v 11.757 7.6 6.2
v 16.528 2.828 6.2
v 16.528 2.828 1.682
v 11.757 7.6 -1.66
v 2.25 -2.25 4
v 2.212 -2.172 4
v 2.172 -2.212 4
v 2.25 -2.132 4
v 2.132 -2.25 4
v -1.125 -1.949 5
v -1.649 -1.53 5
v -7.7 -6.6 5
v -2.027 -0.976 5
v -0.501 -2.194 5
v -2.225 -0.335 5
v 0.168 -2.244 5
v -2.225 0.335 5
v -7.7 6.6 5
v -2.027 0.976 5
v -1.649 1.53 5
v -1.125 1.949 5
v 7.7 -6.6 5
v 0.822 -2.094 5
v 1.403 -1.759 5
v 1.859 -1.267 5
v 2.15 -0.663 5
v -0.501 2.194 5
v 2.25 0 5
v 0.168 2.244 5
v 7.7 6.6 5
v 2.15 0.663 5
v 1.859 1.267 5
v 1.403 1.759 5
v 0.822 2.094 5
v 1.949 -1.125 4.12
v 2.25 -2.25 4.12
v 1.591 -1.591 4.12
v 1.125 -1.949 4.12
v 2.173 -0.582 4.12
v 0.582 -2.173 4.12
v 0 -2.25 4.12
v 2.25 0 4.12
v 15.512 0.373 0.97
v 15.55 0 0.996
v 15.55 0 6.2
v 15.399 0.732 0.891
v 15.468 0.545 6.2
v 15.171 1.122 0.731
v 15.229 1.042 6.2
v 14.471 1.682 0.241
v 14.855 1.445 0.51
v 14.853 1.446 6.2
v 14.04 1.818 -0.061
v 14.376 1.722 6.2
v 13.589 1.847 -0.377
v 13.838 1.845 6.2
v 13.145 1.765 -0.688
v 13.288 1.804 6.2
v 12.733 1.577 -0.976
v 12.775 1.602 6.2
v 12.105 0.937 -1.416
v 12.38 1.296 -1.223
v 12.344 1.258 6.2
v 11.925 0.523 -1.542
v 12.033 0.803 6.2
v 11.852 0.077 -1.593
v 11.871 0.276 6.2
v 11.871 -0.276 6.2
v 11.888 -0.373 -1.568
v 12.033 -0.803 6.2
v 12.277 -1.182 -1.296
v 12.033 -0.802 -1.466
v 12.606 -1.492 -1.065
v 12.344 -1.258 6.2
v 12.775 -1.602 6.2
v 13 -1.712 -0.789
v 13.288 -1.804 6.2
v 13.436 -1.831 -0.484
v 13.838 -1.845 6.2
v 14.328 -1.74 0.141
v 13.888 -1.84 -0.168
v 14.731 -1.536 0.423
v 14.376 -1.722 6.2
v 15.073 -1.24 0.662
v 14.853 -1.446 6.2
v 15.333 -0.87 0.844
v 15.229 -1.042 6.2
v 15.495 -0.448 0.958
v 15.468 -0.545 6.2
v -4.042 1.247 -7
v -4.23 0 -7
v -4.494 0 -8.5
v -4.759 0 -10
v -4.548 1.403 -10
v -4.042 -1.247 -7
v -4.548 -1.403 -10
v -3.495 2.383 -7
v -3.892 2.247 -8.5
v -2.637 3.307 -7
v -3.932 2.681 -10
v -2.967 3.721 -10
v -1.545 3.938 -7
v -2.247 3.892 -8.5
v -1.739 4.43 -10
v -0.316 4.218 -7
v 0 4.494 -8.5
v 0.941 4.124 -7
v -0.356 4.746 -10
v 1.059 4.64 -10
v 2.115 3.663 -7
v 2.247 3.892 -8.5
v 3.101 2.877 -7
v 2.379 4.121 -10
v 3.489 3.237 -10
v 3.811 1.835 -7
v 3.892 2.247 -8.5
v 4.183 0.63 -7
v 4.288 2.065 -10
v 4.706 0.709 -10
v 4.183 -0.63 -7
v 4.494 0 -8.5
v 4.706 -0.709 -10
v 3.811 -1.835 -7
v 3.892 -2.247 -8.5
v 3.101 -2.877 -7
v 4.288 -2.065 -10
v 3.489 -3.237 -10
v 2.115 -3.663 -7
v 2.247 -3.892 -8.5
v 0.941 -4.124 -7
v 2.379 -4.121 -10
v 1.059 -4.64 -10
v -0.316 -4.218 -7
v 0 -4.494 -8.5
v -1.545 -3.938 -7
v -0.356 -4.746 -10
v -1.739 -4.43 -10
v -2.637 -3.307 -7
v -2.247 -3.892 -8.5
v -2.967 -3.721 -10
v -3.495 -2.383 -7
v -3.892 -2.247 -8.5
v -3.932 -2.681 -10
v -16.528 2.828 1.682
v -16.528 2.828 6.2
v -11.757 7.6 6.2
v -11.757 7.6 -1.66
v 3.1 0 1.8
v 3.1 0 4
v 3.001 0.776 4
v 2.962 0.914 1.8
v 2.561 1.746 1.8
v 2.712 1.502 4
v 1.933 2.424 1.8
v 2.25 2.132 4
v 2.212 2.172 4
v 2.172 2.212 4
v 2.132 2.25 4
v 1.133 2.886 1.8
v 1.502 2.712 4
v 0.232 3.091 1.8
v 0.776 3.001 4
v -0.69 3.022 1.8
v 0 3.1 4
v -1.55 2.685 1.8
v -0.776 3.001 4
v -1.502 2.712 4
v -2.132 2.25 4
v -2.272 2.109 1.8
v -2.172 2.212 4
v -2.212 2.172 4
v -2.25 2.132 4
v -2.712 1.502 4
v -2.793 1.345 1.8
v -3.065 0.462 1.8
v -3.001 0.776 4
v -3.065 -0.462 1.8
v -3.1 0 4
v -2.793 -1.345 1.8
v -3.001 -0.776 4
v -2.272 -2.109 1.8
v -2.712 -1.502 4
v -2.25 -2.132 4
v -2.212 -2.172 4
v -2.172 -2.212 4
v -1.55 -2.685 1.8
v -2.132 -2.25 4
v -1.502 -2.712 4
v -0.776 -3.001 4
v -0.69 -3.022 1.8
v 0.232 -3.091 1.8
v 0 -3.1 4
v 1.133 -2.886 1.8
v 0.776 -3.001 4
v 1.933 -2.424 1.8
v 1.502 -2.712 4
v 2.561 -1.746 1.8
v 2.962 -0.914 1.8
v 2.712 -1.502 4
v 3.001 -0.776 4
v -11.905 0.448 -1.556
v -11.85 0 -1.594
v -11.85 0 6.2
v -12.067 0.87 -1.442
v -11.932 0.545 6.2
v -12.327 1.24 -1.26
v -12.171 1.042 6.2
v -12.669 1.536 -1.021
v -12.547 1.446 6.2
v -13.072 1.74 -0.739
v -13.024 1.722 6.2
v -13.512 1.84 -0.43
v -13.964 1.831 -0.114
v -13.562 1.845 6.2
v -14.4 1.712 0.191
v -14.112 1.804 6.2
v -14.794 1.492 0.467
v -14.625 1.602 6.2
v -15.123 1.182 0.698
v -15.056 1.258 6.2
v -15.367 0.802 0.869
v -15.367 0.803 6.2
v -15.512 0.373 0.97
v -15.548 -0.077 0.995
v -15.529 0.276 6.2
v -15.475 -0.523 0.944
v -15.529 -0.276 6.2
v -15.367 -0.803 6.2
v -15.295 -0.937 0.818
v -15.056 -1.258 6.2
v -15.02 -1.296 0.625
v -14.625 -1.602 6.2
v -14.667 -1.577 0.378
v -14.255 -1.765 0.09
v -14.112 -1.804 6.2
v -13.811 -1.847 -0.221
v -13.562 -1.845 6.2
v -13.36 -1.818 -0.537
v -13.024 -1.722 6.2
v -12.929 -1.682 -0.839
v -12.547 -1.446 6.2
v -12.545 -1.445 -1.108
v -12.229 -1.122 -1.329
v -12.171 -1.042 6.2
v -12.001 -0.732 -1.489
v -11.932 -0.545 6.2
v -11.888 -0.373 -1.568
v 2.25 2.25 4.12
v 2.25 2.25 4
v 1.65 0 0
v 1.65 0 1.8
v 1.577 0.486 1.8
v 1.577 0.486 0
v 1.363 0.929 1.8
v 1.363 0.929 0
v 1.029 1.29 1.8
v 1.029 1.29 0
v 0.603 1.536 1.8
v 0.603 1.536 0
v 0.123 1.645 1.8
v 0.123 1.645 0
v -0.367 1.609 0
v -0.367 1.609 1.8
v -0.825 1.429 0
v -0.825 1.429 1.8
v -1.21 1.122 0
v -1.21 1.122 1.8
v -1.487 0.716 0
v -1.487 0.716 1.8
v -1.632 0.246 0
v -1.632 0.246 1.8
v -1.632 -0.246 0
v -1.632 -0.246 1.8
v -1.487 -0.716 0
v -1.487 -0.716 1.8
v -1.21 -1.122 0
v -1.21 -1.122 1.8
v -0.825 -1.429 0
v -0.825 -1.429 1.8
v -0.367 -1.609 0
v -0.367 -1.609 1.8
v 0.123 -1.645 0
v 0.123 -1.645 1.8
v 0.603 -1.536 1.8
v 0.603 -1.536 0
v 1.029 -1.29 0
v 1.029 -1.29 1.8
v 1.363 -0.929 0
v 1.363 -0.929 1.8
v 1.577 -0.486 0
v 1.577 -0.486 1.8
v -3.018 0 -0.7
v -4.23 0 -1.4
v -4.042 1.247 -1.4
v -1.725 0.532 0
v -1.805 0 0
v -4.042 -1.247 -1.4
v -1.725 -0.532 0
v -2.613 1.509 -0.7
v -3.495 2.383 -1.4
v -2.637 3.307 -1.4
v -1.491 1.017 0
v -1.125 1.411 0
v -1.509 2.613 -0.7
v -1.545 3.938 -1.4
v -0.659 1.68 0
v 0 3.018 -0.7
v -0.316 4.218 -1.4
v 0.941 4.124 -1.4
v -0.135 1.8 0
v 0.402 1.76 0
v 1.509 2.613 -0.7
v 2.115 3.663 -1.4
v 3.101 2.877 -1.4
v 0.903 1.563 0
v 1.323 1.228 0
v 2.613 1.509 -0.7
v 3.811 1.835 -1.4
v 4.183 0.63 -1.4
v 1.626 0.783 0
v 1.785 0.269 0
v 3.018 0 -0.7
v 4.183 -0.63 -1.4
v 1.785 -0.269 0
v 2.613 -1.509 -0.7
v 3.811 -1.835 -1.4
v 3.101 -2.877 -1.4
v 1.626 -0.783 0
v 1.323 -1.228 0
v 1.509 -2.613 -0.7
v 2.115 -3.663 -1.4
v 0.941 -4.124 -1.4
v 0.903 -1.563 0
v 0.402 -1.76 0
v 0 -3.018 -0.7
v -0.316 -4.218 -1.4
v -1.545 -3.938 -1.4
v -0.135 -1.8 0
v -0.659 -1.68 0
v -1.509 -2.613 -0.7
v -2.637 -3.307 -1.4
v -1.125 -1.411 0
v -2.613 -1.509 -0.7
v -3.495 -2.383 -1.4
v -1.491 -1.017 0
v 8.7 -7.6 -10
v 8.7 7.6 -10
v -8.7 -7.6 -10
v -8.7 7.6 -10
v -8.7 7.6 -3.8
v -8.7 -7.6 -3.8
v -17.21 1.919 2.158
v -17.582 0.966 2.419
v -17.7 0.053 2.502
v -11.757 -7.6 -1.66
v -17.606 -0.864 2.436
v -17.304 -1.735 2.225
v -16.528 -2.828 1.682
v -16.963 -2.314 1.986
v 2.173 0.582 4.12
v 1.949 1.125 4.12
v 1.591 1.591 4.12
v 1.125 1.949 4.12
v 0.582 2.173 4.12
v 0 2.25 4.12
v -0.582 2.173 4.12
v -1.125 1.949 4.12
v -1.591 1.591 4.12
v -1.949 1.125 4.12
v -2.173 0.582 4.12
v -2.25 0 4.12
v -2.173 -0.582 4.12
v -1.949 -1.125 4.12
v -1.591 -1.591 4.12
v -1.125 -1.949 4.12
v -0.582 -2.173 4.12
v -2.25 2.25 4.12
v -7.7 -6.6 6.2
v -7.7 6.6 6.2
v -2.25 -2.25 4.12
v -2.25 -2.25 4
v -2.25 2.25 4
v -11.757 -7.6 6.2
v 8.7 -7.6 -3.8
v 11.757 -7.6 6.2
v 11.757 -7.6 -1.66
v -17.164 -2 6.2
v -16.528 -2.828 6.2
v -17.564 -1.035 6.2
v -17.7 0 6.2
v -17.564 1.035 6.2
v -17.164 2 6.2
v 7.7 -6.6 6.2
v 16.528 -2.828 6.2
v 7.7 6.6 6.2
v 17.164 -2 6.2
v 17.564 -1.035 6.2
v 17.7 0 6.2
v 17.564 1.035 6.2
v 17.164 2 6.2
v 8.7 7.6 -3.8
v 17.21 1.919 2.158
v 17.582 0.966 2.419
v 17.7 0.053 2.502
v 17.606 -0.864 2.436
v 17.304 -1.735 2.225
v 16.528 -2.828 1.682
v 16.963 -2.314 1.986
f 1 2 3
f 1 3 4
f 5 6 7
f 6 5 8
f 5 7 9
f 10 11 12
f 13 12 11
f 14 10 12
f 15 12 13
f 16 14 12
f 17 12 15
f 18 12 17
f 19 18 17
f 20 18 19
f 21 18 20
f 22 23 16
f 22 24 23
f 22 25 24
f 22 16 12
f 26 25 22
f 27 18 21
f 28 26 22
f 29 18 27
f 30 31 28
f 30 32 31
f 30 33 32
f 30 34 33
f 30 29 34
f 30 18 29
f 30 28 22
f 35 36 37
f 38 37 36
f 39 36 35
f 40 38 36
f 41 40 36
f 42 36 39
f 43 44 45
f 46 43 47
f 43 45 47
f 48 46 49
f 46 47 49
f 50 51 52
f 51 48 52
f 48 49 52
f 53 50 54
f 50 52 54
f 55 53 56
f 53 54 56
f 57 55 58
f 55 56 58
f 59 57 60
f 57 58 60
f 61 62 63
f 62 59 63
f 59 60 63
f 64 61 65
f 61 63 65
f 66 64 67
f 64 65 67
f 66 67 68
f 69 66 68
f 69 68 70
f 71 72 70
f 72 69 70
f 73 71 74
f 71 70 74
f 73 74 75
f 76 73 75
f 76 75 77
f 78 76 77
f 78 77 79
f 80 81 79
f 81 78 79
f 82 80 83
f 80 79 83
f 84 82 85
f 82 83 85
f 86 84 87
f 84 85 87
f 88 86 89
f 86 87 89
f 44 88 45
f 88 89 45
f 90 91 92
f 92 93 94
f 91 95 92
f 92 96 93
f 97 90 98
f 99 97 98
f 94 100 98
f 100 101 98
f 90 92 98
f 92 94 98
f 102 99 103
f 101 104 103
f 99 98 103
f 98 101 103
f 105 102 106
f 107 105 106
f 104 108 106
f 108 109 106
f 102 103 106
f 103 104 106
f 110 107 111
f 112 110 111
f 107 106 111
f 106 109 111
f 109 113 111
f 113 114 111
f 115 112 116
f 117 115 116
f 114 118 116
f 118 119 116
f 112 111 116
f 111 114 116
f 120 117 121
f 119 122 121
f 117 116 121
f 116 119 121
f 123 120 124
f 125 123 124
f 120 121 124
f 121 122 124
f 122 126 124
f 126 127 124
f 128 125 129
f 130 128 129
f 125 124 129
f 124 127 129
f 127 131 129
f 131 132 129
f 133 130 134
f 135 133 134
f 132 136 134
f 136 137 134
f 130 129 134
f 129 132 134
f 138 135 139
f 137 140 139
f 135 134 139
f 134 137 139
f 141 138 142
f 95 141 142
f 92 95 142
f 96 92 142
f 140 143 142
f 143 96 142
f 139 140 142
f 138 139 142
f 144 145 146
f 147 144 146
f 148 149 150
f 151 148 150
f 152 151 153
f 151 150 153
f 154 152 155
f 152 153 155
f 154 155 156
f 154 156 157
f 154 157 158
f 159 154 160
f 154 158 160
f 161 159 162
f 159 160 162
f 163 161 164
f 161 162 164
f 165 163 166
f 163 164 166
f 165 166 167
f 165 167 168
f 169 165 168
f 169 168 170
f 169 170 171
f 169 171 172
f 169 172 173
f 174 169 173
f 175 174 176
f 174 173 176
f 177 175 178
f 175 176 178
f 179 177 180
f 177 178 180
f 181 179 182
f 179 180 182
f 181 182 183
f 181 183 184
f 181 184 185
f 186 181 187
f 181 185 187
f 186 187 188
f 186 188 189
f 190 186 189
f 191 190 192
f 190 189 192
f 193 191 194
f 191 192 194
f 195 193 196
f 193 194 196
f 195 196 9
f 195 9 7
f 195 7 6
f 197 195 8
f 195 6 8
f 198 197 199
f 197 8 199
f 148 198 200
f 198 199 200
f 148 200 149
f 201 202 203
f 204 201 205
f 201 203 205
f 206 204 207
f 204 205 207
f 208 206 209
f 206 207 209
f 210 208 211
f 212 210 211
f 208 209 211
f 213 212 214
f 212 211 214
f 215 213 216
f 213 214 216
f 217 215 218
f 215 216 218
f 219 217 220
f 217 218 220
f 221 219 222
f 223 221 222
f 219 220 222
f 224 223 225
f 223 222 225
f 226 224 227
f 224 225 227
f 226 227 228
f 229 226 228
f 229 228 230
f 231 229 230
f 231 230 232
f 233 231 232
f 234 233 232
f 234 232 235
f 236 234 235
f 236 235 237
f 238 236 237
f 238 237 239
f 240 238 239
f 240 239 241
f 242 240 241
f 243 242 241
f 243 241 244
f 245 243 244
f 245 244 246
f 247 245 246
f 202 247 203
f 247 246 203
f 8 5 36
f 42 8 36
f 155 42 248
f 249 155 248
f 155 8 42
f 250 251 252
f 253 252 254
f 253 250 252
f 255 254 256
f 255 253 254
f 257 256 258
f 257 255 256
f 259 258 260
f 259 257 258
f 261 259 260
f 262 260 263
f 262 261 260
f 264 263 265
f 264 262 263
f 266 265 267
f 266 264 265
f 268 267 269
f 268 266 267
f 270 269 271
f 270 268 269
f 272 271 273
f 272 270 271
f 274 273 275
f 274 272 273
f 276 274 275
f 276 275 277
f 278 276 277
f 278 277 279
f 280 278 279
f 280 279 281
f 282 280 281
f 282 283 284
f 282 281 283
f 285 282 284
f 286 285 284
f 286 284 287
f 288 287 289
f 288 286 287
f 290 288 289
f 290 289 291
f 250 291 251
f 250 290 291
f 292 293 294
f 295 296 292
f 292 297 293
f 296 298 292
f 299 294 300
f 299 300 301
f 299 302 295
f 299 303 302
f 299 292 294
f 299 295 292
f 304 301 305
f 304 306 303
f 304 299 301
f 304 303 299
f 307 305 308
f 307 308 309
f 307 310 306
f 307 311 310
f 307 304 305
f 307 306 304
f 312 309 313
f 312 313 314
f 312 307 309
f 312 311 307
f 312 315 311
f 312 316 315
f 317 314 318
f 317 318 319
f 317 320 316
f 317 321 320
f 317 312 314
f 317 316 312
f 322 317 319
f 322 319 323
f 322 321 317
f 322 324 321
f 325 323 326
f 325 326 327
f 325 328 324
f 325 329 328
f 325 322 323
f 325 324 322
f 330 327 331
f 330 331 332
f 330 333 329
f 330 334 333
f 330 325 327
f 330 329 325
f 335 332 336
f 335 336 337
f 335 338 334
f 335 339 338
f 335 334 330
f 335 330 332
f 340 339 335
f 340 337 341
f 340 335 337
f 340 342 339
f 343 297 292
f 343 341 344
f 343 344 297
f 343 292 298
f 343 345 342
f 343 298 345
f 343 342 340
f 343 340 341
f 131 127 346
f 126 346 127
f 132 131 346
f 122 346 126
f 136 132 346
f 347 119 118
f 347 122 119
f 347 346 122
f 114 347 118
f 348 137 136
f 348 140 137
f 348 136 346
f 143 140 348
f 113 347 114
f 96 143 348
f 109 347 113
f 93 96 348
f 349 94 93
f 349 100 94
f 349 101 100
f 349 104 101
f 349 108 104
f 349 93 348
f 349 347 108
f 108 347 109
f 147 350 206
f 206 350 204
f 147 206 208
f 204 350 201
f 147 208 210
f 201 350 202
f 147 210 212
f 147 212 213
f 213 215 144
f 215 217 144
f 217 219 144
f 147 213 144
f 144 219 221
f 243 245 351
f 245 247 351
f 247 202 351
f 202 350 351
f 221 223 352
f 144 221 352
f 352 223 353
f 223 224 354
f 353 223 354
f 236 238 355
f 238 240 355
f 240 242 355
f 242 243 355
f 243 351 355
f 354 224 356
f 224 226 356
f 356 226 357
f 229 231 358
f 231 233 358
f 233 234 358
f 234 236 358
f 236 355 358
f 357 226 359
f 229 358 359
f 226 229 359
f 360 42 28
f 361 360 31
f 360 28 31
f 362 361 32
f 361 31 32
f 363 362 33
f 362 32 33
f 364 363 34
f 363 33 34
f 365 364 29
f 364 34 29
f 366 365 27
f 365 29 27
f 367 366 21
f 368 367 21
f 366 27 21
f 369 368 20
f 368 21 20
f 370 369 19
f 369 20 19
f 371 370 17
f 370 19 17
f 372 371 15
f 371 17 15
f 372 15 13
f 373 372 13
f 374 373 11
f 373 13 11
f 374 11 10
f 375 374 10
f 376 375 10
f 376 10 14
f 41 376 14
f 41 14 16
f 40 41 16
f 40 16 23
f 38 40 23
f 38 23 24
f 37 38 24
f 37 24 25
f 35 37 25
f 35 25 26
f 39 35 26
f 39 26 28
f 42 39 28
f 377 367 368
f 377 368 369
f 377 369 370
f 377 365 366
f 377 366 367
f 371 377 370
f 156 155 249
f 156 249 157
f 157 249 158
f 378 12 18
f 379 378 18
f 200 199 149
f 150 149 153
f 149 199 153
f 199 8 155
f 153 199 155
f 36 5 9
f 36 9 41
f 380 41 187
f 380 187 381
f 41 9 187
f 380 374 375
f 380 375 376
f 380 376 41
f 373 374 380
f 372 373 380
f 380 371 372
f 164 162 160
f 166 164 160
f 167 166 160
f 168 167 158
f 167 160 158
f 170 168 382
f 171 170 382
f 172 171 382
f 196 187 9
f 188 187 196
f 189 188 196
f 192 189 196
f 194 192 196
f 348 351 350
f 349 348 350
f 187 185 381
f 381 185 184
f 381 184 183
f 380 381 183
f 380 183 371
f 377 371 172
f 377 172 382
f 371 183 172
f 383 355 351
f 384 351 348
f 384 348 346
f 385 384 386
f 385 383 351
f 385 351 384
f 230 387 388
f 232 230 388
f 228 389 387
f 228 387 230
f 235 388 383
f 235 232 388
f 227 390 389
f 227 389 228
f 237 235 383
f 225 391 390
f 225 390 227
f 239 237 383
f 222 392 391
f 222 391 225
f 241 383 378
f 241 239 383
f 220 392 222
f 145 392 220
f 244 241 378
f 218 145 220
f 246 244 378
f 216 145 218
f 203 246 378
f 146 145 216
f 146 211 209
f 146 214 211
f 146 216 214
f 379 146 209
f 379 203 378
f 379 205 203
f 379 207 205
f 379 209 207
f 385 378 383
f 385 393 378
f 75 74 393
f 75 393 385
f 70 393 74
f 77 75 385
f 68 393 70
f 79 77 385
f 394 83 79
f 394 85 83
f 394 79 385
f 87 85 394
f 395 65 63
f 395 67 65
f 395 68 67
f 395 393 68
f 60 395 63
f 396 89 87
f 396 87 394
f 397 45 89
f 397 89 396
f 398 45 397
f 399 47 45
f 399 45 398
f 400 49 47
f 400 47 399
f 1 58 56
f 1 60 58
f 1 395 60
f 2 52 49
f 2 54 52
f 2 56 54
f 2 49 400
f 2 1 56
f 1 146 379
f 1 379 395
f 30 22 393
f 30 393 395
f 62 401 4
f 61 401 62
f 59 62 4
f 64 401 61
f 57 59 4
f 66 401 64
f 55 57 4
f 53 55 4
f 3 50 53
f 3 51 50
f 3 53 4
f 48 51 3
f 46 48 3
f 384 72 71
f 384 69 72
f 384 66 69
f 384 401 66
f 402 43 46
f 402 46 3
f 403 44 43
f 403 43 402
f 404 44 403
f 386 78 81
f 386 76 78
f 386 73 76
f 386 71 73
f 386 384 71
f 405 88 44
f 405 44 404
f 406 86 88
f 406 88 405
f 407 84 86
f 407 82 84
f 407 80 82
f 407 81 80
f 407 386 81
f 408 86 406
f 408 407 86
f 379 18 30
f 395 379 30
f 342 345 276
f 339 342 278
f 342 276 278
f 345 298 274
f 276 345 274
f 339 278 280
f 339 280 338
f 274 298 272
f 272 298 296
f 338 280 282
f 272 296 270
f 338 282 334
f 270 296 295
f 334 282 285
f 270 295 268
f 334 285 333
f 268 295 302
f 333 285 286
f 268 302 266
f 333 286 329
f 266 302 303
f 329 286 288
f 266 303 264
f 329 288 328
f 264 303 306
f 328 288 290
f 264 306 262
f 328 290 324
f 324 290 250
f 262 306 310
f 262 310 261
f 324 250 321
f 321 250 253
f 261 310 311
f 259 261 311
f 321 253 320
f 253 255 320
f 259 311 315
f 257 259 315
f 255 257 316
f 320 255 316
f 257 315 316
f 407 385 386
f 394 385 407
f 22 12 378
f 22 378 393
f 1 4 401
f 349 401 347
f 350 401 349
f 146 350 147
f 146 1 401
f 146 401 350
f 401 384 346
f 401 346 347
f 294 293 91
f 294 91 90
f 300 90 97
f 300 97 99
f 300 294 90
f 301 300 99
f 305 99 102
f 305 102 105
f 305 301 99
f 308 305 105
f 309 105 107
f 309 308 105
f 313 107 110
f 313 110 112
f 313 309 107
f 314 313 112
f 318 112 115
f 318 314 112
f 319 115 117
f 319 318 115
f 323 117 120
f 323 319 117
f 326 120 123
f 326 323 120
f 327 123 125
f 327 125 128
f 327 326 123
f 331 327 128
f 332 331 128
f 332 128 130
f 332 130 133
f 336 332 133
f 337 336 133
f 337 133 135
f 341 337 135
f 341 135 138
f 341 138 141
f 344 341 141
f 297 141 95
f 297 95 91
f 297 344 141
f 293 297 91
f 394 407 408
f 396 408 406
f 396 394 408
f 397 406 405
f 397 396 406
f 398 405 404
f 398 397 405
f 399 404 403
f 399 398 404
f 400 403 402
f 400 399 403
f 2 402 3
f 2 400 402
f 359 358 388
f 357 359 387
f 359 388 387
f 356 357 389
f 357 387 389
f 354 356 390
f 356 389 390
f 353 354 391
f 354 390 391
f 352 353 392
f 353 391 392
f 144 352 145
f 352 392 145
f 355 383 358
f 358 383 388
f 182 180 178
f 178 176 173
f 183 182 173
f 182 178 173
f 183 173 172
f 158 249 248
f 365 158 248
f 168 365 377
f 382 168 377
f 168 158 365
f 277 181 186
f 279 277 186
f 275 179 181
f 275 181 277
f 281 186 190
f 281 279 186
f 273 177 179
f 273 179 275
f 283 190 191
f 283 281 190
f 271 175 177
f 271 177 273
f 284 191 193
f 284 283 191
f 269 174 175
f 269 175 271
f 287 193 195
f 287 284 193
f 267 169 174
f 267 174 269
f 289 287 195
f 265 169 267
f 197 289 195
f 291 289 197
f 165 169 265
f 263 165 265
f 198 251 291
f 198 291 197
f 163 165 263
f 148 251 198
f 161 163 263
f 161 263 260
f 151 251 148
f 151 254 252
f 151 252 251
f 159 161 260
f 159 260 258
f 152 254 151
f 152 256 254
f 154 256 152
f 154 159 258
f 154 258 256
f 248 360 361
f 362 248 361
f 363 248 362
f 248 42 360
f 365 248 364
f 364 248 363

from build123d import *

# Parameters (mm, degrees)
SKETCH1_W           = 17.4
SKETCH1_H           = 15.2
SKETCH1_R           = 1.65
BOSS_EXTRUDE1_DEPTH = 5
SKETCH2_W           = 17.4
SKETCH2_H           = 15.2
SKETCH2_W_2         = 15.4
SKETCH2_H_2         = 13.2
BOSS_EXTRUDE2_DEPTH = 1.2
CUT_EXTRUDE1_START  = -1
SKETCH3_R           = 3.1
CUT_EXTRUDE1_DEPTH  = 2.2
SKETCH4_R           = 2.25
CUT_EXTRUDE2_DEPTH  = 1
SKETCH6_W           = 4.5
SKETCH6_H           = 4.5
CUT_EXTRUDE4_DEPTH  = 0.12
SKETCH7_W           = 17.4
SKETCH7_H           = 15.2
SKETCH7_R           = 4.23
BOSS_EXTRUDE3_DEPTH = 10
CHAMFER1_SIZE       = 3
CHAMFER1_SIZE2      = 0.528980942
SKETCH9_R           = 1.85
BOSS_EXTRUDE5_DEPTH = 10
CUT_EXTRUDE5_DEPTH  = 16.2
CHAMFER3_SIZE       = 1.4
CHAMFER3_SIZE2      = 2.424871131


with BuildPart() as part:
    # Sketch1 → Boss-Extrude1 (new body)
    with BuildSketch(Plane.XY):
        Rectangle(SKETCH1_W, SKETCH1_H)
        Circle(SKETCH1_R, mode=Mode.SUBTRACT)
    extrude(amount=BOSS_EXTRUDE1_DEPTH)

    # Sketch2 → Boss-Extrude2 (add)
    with BuildSketch(Plane.XY.offset(5)):
        Rectangle(SKETCH2_W, SKETCH2_H)
        Rectangle(SKETCH2_W_2, SKETCH2_H_2, mode=Mode.SUBTRACT)
    extrude(amount=BOSS_EXTRUDE2_DEPTH)

    # Sketch3 → Cut-Extrude1 (cut)
    with BuildSketch(Plane.XY.offset(5).offset(CUT_EXTRUDE1_START)):
        Circle(SKETCH3_R)
    extrude(amount=-CUT_EXTRUDE1_DEPTH, mode=Mode.SUBTRACT)

    # Sketch4 → Cut-Extrude2 (cut)
    with BuildSketch(Plane.XY.offset(5)):
        Circle(SKETCH4_R)
    extrude(amount=-CUT_EXTRUDE2_DEPTH, mode=Mode.SUBTRACT)

    # Sketch6 → Cut-Extrude4 (cut)
    with BuildSketch(Plane(origin=(0, 0, 4), x_dir=(-1, 0, 0), z_dir=(0, 0, -1))):
        Rectangle(SKETCH6_W, SKETCH6_H)
    extrude(amount=-CUT_EXTRUDE4_DEPTH, mode=Mode.SUBTRACT)

    # Sketch7 → Boss-Extrude3 (add)
    with BuildSketch(Plane(origin=(0, 0, 0), x_dir=(-1, 0, 0), z_dir=(0, 0, -1))):
        Rectangle(SKETCH7_W, SKETCH7_H)
        Circle(SKETCH7_R, mode=Mode.SUBTRACT)
    extrude(amount=BOSS_EXTRUDE3_DEPTH)

    # Chamfer1
    chamfer1_edges = [part.edges().sort_by_distance(p)[0] for p in [
        (4.23, 0, -10),
    ]]
    chamfer1_side = [part.faces().sort_by_distance(p)[0] for p in [
        (4.23, 0, -5),
    ]]
    chamfer(chamfer1_edges, length=CHAMFER1_SIZE, length2=CHAMFER1_SIZE2, reference=chamfer1_side[0])

    # Sketch9 → Boss-Extrude5 (add)
    with BuildSketch(Plane.XY.offset(6.2)):
        with BuildLine():
            Line((8.7, 7.6), (8.7, -7.6))
            Line((8.7, -7.6), (11.756854249, -7.6))
            Line((11.756854249, -7.6), (16.528427125, -2.828427125))
            ThreePointArc((16.528427125, -2.828427125), (17.7, 0), (16.528427125, 2.828427125))
            Line((16.528427125, 2.828427125), (11.756854249, 7.6))
            Line((11.756854249, 7.6), (8.7, 7.6))
        make_face()
        with Locations((13.7, 0)):
            Circle(SKETCH9_R, mode=Mode.SUBTRACT)
        with BuildLine():
            Line((-8.7, 7.6), (-8.7, -7.6))
            Line((-8.7, -7.6), (-11.756854249, -7.6))
            Line((-11.756854249, -7.6), (-16.528427125, -2.828427125))
            ThreePointArc((-16.528427125, -2.828427125), (-17.7, 0), (-16.528427125, 2.828427125))
            Line((-16.528427125, 2.828427125), (-11.756854249, 7.6))
            Line((-11.756854249, 7.6), (-8.7, 7.6))
        make_face()
        with Locations((-13.7, 0)):
            Circle(SKETCH9_R, mode=Mode.SUBTRACT)
    extrude(amount=-BOSS_EXTRUDE5_DEPTH)

    # Sketch10 → Cut-Extrude5 (cut, through all)
    with BuildSketch(Plane.XZ.offset(7.6)):
        Polygon((-8.7, -3.8), (-19.607158184, 3.837274381), (-19.607158184, -3.8), align=None)
        Polygon((19.607158184, -3.8), (8.7, -3.8), (19.607158184, 3.837274381), align=None)
    extrude(amount=-CUT_EXTRUDE5_DEPTH, mode=Mode.SUBTRACT)

    # Chamfer3
    chamfer3_edges = [part.edges().sort_by_distance(p)[0] for p in [
        (4.23, 0, 0),
    ]]
    chamfer3_side = [part.faces().sort_by_distance(p)[0] for p in [
        (4.23, 0, -3.5),
    ]]
    chamfer(chamfer3_edges, length=CHAMFER3_SIZE, length2=CHAMFER3_SIZE2, reference=chamfer3_side[0])


solid = part.part
